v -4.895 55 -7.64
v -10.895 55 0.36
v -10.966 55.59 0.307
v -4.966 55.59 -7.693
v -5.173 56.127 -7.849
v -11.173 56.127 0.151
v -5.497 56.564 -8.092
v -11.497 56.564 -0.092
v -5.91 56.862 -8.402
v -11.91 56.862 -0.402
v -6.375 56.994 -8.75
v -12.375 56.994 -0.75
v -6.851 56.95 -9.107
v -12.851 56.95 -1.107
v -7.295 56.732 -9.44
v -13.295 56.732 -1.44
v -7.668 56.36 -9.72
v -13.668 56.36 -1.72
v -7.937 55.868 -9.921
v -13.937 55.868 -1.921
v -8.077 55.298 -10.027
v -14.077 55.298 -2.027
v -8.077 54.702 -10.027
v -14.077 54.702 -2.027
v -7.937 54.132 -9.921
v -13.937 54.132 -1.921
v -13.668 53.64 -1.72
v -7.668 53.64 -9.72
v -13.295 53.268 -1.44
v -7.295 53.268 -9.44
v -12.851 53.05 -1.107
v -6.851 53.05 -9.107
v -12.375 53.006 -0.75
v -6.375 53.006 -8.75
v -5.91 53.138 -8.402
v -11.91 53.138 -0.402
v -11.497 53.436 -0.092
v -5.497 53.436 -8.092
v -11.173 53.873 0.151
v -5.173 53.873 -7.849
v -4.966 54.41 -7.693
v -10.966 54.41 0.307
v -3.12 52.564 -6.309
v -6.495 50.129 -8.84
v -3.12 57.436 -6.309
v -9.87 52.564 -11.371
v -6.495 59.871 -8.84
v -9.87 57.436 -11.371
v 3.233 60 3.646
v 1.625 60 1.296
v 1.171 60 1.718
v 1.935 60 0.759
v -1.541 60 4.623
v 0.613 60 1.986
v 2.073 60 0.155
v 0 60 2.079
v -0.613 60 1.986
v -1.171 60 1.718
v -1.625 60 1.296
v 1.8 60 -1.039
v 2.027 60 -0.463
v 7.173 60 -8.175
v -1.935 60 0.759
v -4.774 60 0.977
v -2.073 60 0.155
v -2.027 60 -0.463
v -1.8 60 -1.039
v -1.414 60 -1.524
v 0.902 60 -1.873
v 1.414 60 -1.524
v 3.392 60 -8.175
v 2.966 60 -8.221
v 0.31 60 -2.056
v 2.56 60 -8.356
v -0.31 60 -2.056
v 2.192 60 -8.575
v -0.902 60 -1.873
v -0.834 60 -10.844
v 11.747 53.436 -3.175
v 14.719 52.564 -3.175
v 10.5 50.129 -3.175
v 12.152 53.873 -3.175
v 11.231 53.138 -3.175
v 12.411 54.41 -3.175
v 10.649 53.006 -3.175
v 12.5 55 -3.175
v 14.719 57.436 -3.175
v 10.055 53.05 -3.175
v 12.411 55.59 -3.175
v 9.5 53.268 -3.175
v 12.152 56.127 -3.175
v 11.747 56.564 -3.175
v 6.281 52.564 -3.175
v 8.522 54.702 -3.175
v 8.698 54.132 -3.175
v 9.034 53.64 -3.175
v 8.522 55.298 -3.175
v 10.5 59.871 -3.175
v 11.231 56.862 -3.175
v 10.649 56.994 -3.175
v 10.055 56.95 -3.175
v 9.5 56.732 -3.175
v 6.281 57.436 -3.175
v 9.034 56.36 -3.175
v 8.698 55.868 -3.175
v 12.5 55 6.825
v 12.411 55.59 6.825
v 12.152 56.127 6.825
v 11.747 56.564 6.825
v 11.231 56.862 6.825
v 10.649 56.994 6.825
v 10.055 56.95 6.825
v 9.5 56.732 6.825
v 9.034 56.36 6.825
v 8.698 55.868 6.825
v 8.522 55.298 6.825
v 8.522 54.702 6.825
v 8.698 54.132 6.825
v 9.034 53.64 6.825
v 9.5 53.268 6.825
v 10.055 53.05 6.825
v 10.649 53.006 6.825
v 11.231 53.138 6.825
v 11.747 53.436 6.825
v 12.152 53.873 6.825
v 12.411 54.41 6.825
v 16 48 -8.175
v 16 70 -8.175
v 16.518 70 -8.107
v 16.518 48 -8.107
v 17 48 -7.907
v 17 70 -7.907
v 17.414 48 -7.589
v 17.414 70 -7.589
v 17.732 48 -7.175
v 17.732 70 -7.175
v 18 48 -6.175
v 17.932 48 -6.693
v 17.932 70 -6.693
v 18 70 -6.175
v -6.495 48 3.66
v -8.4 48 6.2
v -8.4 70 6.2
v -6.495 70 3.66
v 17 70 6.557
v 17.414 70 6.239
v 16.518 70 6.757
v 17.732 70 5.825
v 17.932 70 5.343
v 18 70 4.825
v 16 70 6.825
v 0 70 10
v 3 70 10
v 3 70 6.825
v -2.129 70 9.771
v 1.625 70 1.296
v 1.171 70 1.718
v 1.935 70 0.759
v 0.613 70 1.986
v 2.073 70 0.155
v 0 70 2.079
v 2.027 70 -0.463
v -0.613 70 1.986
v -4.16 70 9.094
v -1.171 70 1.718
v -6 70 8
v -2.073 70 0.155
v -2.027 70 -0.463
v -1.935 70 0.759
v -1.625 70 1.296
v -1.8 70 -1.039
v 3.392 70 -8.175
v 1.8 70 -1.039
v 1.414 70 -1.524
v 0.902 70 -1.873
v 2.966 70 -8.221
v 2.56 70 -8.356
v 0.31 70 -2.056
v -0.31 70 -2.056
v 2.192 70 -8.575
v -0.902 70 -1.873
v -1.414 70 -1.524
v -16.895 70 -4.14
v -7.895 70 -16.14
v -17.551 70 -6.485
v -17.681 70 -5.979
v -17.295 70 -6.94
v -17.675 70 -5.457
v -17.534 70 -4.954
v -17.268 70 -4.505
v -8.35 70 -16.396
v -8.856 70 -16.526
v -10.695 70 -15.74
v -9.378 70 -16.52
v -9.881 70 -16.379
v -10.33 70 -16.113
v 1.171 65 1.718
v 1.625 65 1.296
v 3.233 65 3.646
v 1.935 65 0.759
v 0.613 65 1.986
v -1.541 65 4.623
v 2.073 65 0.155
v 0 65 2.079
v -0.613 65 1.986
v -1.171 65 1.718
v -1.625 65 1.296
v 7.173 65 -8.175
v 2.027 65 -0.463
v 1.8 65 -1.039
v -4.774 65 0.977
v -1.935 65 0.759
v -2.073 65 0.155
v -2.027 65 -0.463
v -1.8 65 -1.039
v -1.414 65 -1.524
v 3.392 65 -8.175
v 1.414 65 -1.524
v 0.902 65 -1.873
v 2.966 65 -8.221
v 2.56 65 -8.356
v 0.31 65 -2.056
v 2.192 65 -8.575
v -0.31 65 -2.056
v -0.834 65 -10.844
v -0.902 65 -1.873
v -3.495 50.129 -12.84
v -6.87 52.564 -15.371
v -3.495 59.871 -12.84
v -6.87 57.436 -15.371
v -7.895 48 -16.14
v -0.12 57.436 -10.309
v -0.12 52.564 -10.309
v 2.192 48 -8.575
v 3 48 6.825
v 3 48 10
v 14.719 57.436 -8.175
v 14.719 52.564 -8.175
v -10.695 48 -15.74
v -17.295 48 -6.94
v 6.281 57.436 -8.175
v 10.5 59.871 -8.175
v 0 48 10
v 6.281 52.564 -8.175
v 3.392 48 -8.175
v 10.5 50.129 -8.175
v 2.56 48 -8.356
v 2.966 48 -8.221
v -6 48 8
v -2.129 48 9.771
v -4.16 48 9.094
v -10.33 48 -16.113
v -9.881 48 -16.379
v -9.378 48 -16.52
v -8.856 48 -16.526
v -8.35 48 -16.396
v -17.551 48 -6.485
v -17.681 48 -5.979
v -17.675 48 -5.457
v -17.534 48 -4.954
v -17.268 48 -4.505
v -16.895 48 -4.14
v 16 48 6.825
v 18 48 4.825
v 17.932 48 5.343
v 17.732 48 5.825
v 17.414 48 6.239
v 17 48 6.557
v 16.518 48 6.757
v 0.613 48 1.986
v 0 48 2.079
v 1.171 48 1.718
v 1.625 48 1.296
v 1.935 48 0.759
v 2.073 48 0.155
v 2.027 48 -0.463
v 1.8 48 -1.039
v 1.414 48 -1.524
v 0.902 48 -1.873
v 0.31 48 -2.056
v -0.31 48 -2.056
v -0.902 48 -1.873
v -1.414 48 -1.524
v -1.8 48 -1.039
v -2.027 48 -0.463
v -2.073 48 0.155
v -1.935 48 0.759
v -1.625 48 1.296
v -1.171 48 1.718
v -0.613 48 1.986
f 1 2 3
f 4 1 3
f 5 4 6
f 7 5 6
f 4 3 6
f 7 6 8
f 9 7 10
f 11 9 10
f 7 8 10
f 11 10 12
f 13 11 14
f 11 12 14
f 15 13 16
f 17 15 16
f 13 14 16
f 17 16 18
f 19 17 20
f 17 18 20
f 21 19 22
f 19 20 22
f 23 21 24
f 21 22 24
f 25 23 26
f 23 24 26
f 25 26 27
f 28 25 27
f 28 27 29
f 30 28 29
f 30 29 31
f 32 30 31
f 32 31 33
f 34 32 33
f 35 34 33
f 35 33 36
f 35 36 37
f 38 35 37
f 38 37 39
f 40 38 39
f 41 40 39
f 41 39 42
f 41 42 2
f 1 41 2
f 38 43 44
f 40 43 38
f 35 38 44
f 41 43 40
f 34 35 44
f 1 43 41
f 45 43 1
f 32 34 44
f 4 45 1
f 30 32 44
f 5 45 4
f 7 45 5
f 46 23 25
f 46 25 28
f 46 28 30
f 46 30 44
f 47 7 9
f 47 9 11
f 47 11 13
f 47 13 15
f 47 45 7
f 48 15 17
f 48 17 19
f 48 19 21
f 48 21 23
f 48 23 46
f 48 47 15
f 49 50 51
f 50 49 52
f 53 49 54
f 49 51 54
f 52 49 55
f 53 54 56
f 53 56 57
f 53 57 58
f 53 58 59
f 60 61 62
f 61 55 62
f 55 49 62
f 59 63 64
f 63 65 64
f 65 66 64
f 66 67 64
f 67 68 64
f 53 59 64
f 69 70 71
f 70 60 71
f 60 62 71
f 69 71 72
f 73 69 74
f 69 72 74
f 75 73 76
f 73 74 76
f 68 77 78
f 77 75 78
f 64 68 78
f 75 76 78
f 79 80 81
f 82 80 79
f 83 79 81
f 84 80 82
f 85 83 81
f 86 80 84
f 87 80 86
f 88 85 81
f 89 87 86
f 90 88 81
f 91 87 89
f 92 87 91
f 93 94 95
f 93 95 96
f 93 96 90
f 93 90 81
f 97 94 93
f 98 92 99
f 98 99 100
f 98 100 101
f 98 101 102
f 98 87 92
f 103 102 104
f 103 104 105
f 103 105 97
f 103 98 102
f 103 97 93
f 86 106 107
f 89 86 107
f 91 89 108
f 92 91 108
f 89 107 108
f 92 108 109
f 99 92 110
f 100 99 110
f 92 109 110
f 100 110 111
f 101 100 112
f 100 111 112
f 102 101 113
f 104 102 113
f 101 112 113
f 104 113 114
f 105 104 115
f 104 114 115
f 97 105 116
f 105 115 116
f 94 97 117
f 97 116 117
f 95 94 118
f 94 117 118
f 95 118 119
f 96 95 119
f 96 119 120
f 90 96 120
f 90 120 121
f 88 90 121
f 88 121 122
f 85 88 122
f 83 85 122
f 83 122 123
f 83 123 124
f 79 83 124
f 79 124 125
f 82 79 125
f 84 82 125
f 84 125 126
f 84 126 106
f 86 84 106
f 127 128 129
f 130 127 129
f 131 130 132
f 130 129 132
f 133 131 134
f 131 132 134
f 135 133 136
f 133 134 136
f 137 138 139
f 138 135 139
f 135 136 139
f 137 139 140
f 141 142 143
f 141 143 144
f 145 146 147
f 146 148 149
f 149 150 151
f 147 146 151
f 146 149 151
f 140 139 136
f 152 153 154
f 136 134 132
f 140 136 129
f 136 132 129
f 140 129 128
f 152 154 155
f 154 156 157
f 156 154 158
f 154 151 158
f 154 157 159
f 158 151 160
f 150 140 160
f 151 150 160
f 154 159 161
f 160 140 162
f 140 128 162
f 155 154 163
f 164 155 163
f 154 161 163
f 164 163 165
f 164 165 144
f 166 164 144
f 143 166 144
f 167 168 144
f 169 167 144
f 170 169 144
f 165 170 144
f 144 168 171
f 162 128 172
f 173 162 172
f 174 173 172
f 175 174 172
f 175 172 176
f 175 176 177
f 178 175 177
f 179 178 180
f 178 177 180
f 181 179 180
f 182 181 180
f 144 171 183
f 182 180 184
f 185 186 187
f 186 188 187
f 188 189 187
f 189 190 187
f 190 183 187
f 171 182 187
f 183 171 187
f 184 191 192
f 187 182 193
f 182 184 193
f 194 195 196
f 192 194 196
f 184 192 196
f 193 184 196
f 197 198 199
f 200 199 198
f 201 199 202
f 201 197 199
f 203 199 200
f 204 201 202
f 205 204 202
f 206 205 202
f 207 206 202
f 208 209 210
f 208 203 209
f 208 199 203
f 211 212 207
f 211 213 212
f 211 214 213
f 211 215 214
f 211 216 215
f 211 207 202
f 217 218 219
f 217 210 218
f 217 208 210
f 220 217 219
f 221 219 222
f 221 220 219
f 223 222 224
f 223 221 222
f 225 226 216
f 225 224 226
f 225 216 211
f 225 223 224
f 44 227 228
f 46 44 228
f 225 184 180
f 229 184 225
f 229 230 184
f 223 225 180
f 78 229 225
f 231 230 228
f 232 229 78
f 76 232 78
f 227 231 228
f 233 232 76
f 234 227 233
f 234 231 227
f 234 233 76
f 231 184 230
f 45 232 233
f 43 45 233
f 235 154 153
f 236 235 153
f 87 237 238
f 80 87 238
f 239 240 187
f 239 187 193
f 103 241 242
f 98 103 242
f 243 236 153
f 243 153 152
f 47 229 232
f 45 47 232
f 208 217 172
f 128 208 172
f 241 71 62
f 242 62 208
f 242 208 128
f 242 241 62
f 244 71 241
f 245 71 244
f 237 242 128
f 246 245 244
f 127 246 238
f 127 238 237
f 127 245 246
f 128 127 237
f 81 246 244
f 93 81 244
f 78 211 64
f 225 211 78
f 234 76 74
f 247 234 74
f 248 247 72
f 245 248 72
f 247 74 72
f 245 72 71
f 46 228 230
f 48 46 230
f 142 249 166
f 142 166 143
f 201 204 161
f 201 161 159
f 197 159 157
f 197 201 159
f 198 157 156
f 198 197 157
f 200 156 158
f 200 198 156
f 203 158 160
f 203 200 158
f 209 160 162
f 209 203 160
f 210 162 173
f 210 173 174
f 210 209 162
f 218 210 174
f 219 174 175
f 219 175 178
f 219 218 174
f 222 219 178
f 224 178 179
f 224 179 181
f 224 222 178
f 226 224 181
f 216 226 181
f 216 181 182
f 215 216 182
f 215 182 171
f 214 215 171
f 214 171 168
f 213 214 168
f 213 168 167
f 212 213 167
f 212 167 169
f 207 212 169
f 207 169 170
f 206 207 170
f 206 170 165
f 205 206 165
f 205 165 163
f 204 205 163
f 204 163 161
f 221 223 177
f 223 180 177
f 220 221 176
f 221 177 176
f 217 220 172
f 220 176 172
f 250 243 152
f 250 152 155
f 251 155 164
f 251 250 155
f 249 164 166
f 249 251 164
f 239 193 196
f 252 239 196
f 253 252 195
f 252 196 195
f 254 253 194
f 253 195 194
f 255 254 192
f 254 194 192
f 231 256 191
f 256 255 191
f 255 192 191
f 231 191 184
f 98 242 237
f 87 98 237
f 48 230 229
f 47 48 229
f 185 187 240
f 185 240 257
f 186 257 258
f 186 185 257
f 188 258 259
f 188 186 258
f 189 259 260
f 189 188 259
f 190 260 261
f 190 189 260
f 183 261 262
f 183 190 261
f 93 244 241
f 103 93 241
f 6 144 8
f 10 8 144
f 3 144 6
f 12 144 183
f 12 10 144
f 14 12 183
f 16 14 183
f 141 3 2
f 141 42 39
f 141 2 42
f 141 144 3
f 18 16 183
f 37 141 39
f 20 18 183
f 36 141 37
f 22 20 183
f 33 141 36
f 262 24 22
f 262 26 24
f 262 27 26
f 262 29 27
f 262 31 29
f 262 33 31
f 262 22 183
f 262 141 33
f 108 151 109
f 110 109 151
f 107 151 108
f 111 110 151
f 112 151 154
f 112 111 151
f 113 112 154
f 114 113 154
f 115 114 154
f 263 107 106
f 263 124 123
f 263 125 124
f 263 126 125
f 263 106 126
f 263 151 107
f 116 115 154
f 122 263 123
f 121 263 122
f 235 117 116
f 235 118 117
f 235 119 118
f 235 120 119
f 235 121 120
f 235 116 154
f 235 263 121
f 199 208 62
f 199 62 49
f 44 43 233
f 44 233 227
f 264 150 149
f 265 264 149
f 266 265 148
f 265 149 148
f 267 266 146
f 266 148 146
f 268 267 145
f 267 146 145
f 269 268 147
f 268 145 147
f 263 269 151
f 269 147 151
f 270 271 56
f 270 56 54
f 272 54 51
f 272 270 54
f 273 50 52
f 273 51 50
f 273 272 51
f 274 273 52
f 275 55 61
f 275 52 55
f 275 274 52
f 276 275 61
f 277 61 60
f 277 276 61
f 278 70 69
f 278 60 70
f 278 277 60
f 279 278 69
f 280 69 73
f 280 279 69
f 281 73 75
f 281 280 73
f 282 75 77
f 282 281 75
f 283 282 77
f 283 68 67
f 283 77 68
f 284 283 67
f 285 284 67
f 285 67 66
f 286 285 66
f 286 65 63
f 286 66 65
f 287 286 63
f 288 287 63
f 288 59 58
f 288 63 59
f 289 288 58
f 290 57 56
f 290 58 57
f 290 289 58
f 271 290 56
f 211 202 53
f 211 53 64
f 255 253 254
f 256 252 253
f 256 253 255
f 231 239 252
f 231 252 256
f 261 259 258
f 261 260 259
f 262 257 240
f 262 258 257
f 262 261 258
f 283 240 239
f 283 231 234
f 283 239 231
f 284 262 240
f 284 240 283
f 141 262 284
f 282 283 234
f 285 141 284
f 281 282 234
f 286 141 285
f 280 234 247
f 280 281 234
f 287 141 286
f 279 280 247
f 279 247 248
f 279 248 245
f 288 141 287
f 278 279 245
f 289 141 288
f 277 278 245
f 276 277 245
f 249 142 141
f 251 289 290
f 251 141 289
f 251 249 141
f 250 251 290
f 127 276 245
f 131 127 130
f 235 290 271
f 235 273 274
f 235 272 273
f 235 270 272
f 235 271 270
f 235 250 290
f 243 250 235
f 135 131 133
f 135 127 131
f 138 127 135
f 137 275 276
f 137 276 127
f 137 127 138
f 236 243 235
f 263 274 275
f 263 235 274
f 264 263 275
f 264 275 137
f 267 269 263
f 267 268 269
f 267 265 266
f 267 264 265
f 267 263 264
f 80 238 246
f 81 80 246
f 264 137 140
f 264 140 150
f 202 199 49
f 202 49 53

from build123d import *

# Parameters (mm, degrees)
SKETCH1_R           = 2.0788
BOSS_EXTRUDE1_DEPTH = 70
SKETCH2_R           = 2
CUT_EXTRUDE1_DEPTH  = 15
SKETCH3_R           = 2
CUT_EXTRUDE2_DEPTH  = 15
CUT_EXTRUDE3_DEPTH  = 5
CUT_EXTRUDE4_DEPTH  = 5
CUT_EXTRUDE5_START  = -5
CUT_EXTRUDE5_DEPTH  = 5
FILLET1_R           = 2
SKETCH8_W           = 42.920227698
SKETCH8_H           = 32.849947737
CUT_EXTRUDE6_DEPTH  = 48


with BuildPart() as part:
    # Sketch1 → Boss-Extrude1 (new body)
    with BuildSketch(Plane(origin=(0, 0, 0), x_dir=(1, 0, 0), z_dir=(0, 1, 0))):
        with BuildLine():
            Line((-18.495, 5.34), (-9.495, 17.34))
            Line((-9.495, 17.34), (2.725, 8.175))
            Line((2.725, 8.175), (18, 8.175))
            Line((18, 8.175), (18, -6.825))
            Line((18, -6.825), (3, -6.825))
            Line((3, -6.825), (3, -10))
            Line((3, -10), (0, -10))
            ThreePointArc((0, -10), (-3.16227766, -9.486832981), (-6, -8))
            Line((-6, -8), (-8.4, -6.2))
            Line((-8.4, -6.2), (-6.495, -3.66))
            Line((-6.495, -3.66), (-18.495, 5.34))
        make_face()
        with Locations(Location((0, 0, 0), (0, 0, 270))):
            Circle(SKETCH1_R, mode=Mode.SUBTRACT)
    extrude(amount=BOSS_EXTRUDE1_DEPTH)

    # Sketch2 → Cut-Extrude1 (cut)
    with BuildSketch(Plane.XY.offset(6.825)):
        with Locations((10.5, 15)):
            Circle(SKETCH2_R)
        with Locations((10.5, 55)):
            Circle(SKETCH2_R)
    extrude(amount=-CUT_EXTRUDE1_DEPTH, mode=Mode.SUBTRACT)

    # Sketch3 → Cut-Extrude2 (cut)
    with BuildSketch(Plane(origin=(-4.095, 0, 5.46), x_dir=(0.8000000000000002, 0, 0.5999999999999999), z_dir=(-0.5999999999999999, 0, 0.8000000000000003))):
        with Locations((-10.5, 15)):
            Circle(SKETCH3_R)
        with Locations((-10.5, 55)):
            Circle(SKETCH3_R)
    extrude(amount=-CUT_EXTRUDE2_DEPTH, mode=Mode.SUBTRACT)

    # Sketch4 → Cut-Extrude3 (cut)
    with BuildSketch(Plane(origin=(4.905, 0, -6.54), x_dir=(-0.8000000000000002, 0, -0.5999999999999998), z_dir=(0.5999999999999998, 0, -0.8000000000000002))):
        Polygon((10.5, 59.871392896), (6.28125, 57.435696448), (6.28125, 52.564303552), (10.5, 50.128607104), (14.71875, 52.564303552), (14.71875, 57.435696448), align=None)
        Polygon((10.5, 10.128607104), (14.71875, 12.564303552), (14.71875, 17.435696448), (10.5, 19.871392896), (6.28125, 17.435696448), (6.28125, 12.564303552), align=None)
    extrude(amount=-CUT_EXTRUDE3_DEPTH, mode=Mode.SUBTRACT)

    # Sketch5 → Cut-Extrude4 (cut)
    with BuildSketch(Plane(origin=(0, 0, -8.175), x_dir=(-1, 0, 0), z_dir=(0, 0, -1))):
        Polygon((-10.5, 50.128607104), (-6.28125, 52.564303552), (-6.28125, 57.435696448), (-10.5, 59.871392896), (-14.71875, 57.435696448), (-14.71875, 52.564303552), align=None)
        Polygon((-10.5, 10.128607104), (-6.28125, 12.564303552), (-6.28125, 17.435696448), (-10.5, 19.871392896), (-14.71875, 17.435696448), (-14.71875, 12.564303552), align=None)
    extrude(amount=-CUT_EXTRUDE4_DEPTH, mode=Mode.SUBTRACT)

    # Sketch7 → Cut-Extrude5 (cut)
    with BuildSketch(Plane(origin=(0, 70, 0), x_dir=(1, 0, 0), z_dir=(0, 1, 0)).offset(CUT_EXTRUDE5_START)):
        Polygon((-4.773906582, -0.97690802), (-0.83361646, 10.843962345), (2.725, 8.175), (7.173270575, 8.175), (3.232980454, -3.645870365), (-1.540926128, -4.622778385), align=None)
    extrude(amount=-CUT_EXTRUDE5_DEPTH, mode=Mode.SUBTRACT)

    # Fillet1
    fillet1_edges = [part.edges().sort_by_distance(p)[0] for p in [
        (2.725, 30, -8.175),
        (-18.495, 35, -5.34),
        (-9.495, 35, -17.34),
        (2.725, 67.5, -8.175),
        (18, 35, -8.175),
        (18, 35, 6.825),
    ]]
    fillet(fillet1_edges, radius=FILLET1_R)

    # Sketch8 → Cut-Extrude6 (cut)
    with BuildSketch(Plane.XZ):
        with Locations((0.986015294, -3.374502162)):
            Rectangle(SKETCH8_W, SKETCH8_H)
    extrude(amount=-CUT_EXTRUDE6_DEPTH, mode=Mode.SUBTRACT)


solid = part.part
